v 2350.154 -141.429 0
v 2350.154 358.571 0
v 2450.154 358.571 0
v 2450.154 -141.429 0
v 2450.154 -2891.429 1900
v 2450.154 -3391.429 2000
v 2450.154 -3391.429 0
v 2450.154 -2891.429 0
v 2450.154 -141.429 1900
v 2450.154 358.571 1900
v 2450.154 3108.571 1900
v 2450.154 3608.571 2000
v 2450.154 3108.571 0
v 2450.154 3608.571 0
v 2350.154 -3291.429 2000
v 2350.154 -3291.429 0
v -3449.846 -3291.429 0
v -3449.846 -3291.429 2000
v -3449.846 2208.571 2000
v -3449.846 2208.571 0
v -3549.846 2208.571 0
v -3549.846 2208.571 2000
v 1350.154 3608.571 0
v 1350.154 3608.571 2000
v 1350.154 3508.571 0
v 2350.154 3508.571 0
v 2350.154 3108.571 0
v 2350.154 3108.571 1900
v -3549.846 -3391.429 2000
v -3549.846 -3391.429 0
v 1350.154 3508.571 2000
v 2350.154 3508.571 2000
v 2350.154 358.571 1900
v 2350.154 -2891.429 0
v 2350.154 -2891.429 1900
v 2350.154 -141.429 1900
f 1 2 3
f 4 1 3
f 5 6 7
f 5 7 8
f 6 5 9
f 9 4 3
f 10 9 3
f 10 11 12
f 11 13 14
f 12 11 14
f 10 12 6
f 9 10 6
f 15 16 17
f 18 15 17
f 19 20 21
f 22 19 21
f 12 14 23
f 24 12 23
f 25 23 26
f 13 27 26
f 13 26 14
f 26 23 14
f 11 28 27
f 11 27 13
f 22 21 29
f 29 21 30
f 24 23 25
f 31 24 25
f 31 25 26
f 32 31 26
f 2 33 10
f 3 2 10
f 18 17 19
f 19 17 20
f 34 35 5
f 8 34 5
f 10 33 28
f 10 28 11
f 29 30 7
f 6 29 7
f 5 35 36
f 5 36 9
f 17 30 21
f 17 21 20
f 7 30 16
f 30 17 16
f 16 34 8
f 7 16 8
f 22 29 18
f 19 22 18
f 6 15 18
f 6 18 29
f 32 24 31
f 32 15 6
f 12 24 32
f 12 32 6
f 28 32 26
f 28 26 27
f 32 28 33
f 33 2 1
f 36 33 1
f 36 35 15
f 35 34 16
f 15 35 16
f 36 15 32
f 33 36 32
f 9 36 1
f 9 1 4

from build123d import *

# Parameters (mm, degrees)
F1_DEPTH = 2000
F2_W     = 100
F2_H     = 2750
F3_DEPTH = 1900


with BuildPart() as f1:
    # F0 (on Top) → F1 (new body)
    with BuildSketch(Plane.XY):
        Polygon((2450.153731, 3608.570844), (1350.153731, 3608.570844), (1350.153731, 3508.570844), (2350.153731, 3508.570844), (2350.153731, -3291.429156), (-3449.846269, -3291.429156), (-3449.846269, 2208.570844), (-3549.846269, 2208.570844), (-3549.846269, -3391.429156), (2450.153731, -3391.429156), align=None)
    extrude(amount=F1_DEPTH)

    # F2 (on face) → F3 (cut)
    with BuildSketch(Plane(origin=(0, 0, 0), x_dir=(1, 0, 0), z_dir=(0, 0, -1))):
        with Locations((2400.153731, -1733.570844)):
            Rectangle(F2_W, F2_H)
        with Locations((2400.153731, 1516.429156)):
            Rectangle(F2_W, F2_H)
    extrude(amount=-F3_DEPTH, mode=Mode.SUBTRACT)


solid = f1.part
